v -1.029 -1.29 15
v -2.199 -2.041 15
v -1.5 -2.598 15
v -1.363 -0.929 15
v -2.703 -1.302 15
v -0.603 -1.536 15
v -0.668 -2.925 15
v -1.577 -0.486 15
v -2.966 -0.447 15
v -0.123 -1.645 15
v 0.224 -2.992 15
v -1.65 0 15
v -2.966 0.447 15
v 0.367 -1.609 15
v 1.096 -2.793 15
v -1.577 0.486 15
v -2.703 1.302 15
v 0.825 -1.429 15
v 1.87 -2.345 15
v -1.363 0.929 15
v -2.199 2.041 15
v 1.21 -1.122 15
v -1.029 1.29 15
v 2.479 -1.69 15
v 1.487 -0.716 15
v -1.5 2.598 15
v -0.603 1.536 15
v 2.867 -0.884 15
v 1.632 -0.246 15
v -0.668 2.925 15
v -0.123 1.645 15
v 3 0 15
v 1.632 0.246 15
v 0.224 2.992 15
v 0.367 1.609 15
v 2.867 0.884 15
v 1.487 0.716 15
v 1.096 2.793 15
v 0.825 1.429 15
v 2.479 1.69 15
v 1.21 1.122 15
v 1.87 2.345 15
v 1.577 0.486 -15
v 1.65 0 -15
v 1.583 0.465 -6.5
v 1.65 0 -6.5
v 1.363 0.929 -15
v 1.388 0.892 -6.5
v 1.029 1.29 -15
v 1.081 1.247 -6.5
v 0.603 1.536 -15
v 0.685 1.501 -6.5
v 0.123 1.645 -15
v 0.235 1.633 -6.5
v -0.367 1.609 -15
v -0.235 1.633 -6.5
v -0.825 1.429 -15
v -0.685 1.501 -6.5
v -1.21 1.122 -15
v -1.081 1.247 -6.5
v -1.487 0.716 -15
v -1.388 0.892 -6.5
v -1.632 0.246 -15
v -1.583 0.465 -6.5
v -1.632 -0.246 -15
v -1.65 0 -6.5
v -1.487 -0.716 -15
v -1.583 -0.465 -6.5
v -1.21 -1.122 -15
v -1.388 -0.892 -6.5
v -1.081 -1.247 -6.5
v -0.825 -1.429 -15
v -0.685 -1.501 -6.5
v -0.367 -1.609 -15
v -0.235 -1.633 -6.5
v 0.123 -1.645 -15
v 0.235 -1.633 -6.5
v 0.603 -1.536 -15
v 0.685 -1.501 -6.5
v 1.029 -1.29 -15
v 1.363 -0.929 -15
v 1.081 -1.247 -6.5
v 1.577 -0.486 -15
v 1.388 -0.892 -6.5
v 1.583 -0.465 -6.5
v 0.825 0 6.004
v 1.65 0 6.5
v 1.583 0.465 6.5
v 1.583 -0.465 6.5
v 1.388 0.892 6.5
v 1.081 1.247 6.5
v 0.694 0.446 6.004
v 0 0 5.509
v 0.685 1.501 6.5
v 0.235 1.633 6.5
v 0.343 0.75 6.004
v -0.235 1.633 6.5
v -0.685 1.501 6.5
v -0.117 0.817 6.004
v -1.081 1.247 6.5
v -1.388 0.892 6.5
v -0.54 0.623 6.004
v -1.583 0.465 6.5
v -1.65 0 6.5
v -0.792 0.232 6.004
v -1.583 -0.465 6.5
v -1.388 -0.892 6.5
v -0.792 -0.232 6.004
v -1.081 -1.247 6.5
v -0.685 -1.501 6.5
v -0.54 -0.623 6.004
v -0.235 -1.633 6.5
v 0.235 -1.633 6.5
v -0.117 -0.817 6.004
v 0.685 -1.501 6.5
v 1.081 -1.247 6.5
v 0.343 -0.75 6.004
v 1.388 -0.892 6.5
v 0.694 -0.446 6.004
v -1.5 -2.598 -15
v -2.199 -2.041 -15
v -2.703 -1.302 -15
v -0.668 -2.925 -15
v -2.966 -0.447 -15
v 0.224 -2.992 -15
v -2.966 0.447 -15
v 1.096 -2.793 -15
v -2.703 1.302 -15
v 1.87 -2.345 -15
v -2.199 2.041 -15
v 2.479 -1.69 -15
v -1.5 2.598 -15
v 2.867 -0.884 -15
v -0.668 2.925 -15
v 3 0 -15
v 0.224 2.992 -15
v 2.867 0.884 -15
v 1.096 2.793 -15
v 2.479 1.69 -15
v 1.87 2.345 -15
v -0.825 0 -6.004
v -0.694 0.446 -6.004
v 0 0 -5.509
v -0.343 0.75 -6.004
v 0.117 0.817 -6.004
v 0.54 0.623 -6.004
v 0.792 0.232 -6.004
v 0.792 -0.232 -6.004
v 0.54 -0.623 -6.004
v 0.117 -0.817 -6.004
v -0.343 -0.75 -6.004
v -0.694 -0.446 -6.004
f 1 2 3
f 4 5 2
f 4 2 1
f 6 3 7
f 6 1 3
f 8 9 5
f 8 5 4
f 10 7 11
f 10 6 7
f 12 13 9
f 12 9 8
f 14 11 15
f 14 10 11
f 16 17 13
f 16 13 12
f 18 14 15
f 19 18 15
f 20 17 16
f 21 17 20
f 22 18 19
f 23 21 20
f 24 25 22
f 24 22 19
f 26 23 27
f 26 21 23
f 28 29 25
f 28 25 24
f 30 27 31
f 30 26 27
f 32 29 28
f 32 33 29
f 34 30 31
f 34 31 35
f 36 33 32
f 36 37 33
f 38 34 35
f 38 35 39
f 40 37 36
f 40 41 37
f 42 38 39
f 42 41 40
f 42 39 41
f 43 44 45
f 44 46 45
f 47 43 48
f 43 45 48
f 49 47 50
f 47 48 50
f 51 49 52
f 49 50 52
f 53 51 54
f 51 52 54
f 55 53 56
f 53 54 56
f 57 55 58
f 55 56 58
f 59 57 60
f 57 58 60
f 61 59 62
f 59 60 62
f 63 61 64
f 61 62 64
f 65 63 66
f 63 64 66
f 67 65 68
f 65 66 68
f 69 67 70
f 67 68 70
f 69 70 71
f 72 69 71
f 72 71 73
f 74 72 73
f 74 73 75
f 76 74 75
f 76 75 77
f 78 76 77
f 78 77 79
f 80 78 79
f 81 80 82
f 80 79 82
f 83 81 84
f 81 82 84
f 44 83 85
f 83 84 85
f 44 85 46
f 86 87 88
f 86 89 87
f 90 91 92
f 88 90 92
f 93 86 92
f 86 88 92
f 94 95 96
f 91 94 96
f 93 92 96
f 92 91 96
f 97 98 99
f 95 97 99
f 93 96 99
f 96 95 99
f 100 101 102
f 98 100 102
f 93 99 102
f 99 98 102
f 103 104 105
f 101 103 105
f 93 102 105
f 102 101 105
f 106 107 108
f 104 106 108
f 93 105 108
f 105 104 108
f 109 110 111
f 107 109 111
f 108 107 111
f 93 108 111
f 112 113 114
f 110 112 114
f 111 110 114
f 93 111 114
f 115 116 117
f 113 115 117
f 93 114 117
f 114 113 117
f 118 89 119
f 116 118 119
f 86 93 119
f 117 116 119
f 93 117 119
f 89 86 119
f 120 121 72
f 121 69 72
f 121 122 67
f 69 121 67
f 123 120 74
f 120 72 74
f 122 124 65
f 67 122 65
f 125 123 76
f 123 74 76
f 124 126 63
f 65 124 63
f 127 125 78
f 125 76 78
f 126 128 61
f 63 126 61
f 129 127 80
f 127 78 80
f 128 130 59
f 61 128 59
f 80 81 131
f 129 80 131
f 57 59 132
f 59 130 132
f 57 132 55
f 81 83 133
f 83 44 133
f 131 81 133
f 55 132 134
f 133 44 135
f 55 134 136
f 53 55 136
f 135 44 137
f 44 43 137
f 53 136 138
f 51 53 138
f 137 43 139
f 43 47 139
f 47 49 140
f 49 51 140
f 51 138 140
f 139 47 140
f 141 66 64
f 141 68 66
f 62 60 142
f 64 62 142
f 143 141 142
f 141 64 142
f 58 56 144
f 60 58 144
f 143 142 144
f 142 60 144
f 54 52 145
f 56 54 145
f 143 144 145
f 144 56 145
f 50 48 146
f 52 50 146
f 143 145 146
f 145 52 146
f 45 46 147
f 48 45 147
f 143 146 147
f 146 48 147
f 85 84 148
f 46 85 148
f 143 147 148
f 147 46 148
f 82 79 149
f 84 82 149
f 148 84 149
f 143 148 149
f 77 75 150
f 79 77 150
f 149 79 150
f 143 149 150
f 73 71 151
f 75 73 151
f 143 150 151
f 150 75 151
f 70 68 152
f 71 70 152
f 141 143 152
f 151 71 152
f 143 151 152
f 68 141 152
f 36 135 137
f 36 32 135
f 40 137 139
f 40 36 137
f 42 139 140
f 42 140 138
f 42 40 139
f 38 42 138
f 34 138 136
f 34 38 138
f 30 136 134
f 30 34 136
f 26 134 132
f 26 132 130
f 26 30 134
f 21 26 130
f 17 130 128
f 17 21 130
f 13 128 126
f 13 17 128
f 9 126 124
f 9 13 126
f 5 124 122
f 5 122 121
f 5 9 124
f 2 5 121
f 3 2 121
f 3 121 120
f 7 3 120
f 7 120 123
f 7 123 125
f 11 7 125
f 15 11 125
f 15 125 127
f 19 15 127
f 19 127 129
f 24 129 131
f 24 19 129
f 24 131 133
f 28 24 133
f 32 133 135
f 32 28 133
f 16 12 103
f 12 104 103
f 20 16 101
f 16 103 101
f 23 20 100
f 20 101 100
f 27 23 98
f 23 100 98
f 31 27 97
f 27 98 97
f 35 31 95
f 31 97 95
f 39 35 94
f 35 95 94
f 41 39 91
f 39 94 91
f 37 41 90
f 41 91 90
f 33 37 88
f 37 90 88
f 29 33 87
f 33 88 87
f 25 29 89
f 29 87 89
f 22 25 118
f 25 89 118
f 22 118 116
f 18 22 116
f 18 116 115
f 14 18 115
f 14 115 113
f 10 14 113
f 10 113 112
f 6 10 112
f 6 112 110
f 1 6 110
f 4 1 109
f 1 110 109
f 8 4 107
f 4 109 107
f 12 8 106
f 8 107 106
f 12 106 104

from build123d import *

# Parameters (mm, degrees)
SKETCH_1_R               = 3
EXTRUDE_1_DEPTH          = 15
M4X0_7_1_D               = 3.3
M4X0_7_1_DEPTH           = 8.5
M4X0_7_1_TIP             = 0.991420021
M4X0_7_1_ON_FACE_2_D     = 3.3
M4X0_7_1_ON_FACE_2_DEPTH = 8.5
M4X0_7_1_ON_FACE_2_TIP   = 0.991420021
M4X0_7_1_ON_FACE_3_D     = 3.3
M4X0_7_1_ON_FACE_3_DEPTH = 8.5
M4X0_7_1_ON_FACE_3_TIP   = 0.991420021


with BuildPart() as part:
    # ｽｹｯﾁ1 → ﾎﾞｽ - 押し出し1 (new body, symmetric)
    with BuildSketch(Plane.XY):
        Circle(SKETCH_1_R)
    extrude(amount=EXTRUDE_1_DEPTH, both=True)

    # M4x0.7 ねじ穴1
    with Locations(Plane.XY.offset(15)):
        with Locations((0, 0)):
            Hole(M4X0_7_1_D / 2, depth=M4X0_7_1_DEPTH)
            with Locations((0, 0, -(M4X0_7_1_DEPTH + M4X0_7_1_TIP / 2))):  # 118° drill point
                Cone(0, M4X0_7_1_D / 2, M4X0_7_1_TIP, mode=Mode.SUBTRACT)

    # M4x0.7 ねじ穴1 on face 2
    with Locations(Plane(origin=(0, 0, -15), x_dir=(-1, 0, 0), z_dir=(0, 0, -1))):
        with Locations((0, 0)):
            Hole(M4X0_7_1_ON_FACE_2_D / 2, depth=M4X0_7_1_ON_FACE_2_DEPTH)
            with Locations((0, 0, -(M4X0_7_1_ON_FACE_2_DEPTH + M4X0_7_1_ON_FACE_2_TIP / 2))):  # 118° drill point
                Cone(0, M4X0_7_1_ON_FACE_2_D / 2, M4X0_7_1_ON_FACE_2_TIP, mode=Mode.SUBTRACT)

    # M4x0.7 ねじ穴1 on face 3
    with Locations(Plane(origin=(8.523250275, 2.088443879, 0), x_dir=(1, 0, 0), z_dir=(0, 0, 1))):
        with Locations((0, 0)):
            Hole(M4X0_7_1_ON_FACE_3_D / 2, depth=M4X0_7_1_ON_FACE_3_DEPTH)
            with Locations((0, 0, -(M4X0_7_1_ON_FACE_3_DEPTH + M4X0_7_1_ON_FACE_3_TIP / 2))):  # 118° drill point
                Cone(0, M4X0_7_1_ON_FACE_3_D / 2, M4X0_7_1_ON_FACE_3_TIP, mode=Mode.SUBTRACT)


solid = part.part
